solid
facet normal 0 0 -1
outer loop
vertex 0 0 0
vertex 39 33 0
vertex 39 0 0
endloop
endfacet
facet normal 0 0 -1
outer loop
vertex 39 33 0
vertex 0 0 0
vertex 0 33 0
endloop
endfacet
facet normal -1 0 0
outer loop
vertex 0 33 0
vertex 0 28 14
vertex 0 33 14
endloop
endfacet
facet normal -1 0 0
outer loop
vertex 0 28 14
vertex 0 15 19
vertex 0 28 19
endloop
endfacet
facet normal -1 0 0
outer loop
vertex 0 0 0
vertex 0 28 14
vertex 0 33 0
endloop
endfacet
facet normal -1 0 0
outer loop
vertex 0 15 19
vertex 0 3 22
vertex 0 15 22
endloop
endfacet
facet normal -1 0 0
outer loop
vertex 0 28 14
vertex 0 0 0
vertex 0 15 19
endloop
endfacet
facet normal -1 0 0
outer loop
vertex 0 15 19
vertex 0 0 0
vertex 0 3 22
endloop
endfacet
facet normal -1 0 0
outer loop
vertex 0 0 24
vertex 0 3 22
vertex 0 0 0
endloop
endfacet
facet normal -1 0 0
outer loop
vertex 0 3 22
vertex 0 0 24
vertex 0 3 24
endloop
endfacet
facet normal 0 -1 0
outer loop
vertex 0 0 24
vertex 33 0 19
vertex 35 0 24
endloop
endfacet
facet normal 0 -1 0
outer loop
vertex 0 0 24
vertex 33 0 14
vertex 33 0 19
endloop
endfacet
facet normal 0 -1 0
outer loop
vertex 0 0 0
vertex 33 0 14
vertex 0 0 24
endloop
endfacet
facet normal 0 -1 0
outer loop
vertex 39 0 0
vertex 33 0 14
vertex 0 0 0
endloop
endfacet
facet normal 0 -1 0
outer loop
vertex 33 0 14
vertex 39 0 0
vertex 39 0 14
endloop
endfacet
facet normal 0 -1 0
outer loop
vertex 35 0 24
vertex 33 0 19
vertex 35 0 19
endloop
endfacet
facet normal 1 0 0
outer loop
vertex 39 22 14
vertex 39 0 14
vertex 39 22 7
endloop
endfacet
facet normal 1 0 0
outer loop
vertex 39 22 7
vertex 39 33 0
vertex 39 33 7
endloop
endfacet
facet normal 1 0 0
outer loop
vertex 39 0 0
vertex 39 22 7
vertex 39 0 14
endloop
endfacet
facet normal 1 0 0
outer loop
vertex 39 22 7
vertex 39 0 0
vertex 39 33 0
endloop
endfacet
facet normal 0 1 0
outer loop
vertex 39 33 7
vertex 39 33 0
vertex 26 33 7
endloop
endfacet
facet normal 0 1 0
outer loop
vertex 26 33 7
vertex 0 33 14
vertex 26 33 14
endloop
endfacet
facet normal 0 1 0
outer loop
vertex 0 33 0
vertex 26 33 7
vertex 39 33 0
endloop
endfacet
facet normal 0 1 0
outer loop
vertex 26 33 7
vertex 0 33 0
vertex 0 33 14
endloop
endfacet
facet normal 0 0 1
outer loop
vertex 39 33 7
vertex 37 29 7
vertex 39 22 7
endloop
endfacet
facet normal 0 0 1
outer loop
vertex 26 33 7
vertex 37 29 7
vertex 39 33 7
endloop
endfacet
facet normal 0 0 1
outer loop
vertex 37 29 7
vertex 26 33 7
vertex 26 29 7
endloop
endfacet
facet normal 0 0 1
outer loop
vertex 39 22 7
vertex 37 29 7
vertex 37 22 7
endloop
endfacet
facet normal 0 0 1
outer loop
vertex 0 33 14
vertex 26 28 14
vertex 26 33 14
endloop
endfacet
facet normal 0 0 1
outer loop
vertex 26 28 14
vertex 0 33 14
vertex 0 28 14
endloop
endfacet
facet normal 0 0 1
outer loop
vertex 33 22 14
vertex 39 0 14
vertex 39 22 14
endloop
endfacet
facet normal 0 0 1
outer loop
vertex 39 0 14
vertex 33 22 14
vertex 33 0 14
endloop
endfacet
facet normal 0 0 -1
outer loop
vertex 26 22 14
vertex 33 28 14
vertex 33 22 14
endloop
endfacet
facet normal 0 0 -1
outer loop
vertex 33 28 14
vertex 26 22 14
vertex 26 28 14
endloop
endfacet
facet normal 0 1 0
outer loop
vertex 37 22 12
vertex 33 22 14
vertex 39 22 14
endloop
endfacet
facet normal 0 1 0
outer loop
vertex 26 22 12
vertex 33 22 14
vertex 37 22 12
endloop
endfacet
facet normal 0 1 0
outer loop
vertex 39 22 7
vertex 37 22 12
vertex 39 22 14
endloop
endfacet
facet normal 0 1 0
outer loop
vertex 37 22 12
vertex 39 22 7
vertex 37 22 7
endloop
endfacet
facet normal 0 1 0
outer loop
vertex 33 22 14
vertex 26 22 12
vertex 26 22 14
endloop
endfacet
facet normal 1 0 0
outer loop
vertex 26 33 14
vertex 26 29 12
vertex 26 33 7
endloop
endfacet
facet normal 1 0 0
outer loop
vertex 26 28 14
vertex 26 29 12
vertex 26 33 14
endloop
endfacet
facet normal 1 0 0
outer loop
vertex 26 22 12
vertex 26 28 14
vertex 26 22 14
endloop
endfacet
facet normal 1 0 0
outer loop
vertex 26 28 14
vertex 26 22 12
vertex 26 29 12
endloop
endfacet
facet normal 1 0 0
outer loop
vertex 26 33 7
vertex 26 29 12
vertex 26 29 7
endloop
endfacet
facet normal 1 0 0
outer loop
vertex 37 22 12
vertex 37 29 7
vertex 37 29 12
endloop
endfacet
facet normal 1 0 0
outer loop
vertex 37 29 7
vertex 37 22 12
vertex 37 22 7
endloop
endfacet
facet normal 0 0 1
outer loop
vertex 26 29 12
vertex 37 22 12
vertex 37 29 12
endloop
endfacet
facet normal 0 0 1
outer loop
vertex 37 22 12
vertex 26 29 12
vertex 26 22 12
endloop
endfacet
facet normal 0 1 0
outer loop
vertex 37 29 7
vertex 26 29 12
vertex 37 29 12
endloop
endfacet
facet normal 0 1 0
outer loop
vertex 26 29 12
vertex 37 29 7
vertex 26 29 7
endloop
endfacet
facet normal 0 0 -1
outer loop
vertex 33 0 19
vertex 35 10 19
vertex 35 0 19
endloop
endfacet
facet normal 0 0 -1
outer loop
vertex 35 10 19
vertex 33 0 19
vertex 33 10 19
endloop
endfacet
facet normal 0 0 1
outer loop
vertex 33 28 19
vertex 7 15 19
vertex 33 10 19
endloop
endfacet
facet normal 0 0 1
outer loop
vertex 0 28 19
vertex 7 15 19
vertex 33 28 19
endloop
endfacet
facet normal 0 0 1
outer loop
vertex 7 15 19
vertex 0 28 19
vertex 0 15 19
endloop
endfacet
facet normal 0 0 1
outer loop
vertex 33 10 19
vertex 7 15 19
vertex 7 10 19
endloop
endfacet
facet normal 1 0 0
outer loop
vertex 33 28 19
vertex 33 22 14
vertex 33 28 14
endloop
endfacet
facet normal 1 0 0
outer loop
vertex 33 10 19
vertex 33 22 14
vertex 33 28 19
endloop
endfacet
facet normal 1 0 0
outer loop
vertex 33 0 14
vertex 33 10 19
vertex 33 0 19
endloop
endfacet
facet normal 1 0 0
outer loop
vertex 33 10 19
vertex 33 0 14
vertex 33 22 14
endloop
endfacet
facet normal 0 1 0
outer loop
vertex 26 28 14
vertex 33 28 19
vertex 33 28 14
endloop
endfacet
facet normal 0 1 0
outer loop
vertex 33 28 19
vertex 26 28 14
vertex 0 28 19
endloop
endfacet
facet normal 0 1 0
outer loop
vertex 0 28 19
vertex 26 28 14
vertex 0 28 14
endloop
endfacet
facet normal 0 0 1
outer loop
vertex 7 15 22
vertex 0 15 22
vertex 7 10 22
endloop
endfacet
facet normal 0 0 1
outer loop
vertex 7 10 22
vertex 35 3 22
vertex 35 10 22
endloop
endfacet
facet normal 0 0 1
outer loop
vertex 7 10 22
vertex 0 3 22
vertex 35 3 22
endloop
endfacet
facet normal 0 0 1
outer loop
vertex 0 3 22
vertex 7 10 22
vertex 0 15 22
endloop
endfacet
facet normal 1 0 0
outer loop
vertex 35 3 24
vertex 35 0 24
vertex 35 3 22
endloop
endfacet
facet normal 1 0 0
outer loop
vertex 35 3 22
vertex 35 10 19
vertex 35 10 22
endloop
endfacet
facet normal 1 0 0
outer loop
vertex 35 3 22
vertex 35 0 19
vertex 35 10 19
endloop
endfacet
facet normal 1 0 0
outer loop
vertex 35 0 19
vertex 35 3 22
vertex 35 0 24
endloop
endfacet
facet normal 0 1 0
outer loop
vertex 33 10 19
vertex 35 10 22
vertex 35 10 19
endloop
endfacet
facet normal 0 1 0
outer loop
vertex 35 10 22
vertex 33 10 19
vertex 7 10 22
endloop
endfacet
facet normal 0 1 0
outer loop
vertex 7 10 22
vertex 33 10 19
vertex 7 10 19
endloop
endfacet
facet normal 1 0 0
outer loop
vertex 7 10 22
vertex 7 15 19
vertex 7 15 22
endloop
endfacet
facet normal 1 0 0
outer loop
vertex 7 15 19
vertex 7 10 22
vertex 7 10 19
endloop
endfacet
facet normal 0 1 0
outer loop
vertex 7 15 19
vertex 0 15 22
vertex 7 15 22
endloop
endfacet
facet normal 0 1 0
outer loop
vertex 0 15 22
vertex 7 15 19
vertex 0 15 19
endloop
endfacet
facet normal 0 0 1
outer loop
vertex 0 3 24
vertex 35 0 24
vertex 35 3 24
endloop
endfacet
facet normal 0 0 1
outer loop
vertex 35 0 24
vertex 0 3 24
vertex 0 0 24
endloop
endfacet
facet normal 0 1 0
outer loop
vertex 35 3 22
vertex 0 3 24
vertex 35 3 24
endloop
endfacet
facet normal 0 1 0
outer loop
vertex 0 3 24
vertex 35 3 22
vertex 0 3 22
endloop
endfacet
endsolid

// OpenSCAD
translate([6.5, 5.5, 3.5]) color([0.7978743610995221, 0.8123286615584164, 0.12432480215345709]) cube([13, 11, 7], center=true);
translate([19.5, 5.5, 3.5]) color([0.11600806340273684, 0.49773452003699037, 0.03782437966691787]) cube([13, 11, 7], center=true);
translate([32.5, 5.5, 3.5]) color([0.3350819106008931, 0.6871104903101904, 0.1556641006446543]) cube([13, 11, 7], center=true);
translate([6.5, 16.5, 3.5]) color([0.16655617674247947, 0.5644873855678092, 0.8061184955728092]) cube([13, 11, 7], center=true);
translate([19.5, 16.5, 3.5]) color([0.9914997491156944, 0.08692177434142434, 0.8077725699891862]) cube([13, 11, 7], center=true);
translate([32.5, 16.5, 3.5]) color([0.19804028235278703, 0.22105871931579824, 0.38481190061458204]) cube([13, 11, 7], center=true);
translate([6.5, 27.5, 3.5]) color([0.09807651038324794, 0.5564746075794378, 0.289820808533909]) cube([13, 11, 7], center=true);
translate([19.5, 27.5, 3.5]) color([0.9201526827262252, 0.7882887690133504, 0.714406368727256]) cube([13, 11, 7], center=true);
translate([32.5, 27.5, 3.5]) color([0.21725354658840645, 0.08366324281939452, 0.2201378642652858]) cube([13, 11, 7], center=true);
translate([6.5, 5.5, 10.5]) color([0.9991066326269249, 0.5852279869996022, 0.1665811123789923]) cube([13, 11, 7], center=true);
translate([19.5, 5.5, 10.5]) color([0.1919450116047291, 0.1150124003280546, 0.8219806914298157]) cube([13, 11, 7], center=true);
translate([32.5, 5.5, 10.5]) color([0.8528586901873659, 0.02761895137288195, 0.5258157137901469]) cube([13, 11, 7], center=true);
translate([6.5, 16.5, 10.5]) color([0.752438401258893, 0.20168791799925478, 0.4970874741521001]) cube([13, 11, 7], center=true);
translate([19.5, 16.5, 10.5]) color([0.2564796746315954, 0.6409972685732053, 0.9970404948887329]) cube([13, 11, 7], center=true);
translate([32.5, 16.5, 10.5]) color([0.797433214008021, 0.6234150837835258, 0.10462968943990791]) cube([13, 11, 7], center=true);
translate([6.5, 27.5, 10.5]) color([0.4584080456050631, 0.3616420965372864, 0.8269865896652219]) cube([13, 11, 7], center=true);
translate([19.5, 27.5, 10.5]) color([0.10474628201641056, 0.596240475647071, 0.48790140560568873]) cube([13, 11, 7], center=true);
translate([31.5, 25.5, 9.5]) color([0.5639041170917963, 0.6383635452384463, 0.42323888002080157]) cube([11, 7, 5], center=true);
translate([5.5, 3.5, 16.5]) color([0.5212286449626529, 0.6793183678168555, 0.8877818831984722]) cube([11, 7, 5], center=true);
translate([16.5, 3.5, 16.5]) color([0.8335334993782705, 0.998183045526196, 0.635064793155105]) cube([11, 7, 5], center=true);
translate([27.5, 3.5, 16.5]) color([0.8746990054994174, 0.5428090736997917, 0.9313134045807503]) cube([11, 7, 5], center=true);
translate([5.5, 10.5, 16.5]) color([0.009704659433814156, 0.7055937347007278, 0.7470388851985934]) cube([11, 7, 5], center=true);
translate([16.5, 10.5, 16.5]) color([0.3182594390073298, 0.32182488616904803, 0.5251073848334467]) cube([11, 7, 5], center=true);
translate([27.5, 10.5, 16.5]) color([0.8744832594460391, 0.6025867148054135, 0.15590536476920036]) cube([11, 7, 5], center=true);
translate([5.5, 17.5, 16.5]) color([0.37900510864666237, 0.2943823465565715, 0.7063732058335496]) cube([11, 7, 5], center=true);
translate([16.5, 17.5, 16.5]) color([0.47043138046830235, 0.799945824478888, 0.5165278007752844]) cube([11, 7, 5], center=true);
translate([27.5, 17.5, 16.5]) color([0.9155142682747232, 0.06635468620874474, 0.13049414784187097]) cube([11, 7, 5], center=true);
translate([5.5, 24.5, 16.5]) color([0.3004482911175872, 0.7588987264331779, 0.4485890964462933]) cube([11, 7, 5], center=true);
translate([16.5, 24.5, 16.5]) color([0.8619033855251227, 0.8006454493762514, 0.8686955098516022]) cube([11, 7, 5], center=true);
translate([27.5, 24.5, 16.5]) color([0.4607350972935428, 0.37132186818867685, 0.38223256097056324]) cube([11, 7, 5], center=true);
translate([3.5, 2.5, 20.5]) color([0.5298076607467874, 0.033618014856222844, 0.09064689039119589]) cube([7, 5, 3], center=true);
translate([10.5, 2.5, 20.5]) color([0.7941451579713075, 0.5179983582932232, 0.6001422851572377]) cube([7, 5, 3], center=true);
translate([17.5, 2.5, 20.5]) color([0.07635810782734587, 0.42636667866841493, 0.7546182662703457]) cube([7, 5, 3], center=true);
translate([24.5, 2.5, 20.5]) color([0.2896641383723638, 0.9011387199060191, 0.4178406508691356]) cube([7, 5, 3], center=true);
translate([31.5, 2.5, 20.5]) color([0.9725485107467589, 0.8454919814395919, 0.9722338049752182]) cube([7, 5, 3], center=true);
translate([3.5, 7.5, 20.5]) color([0.6074299110948179, 0.23357109614697547, 0.8647767439340015]) cube([7, 5, 3], center=true);
translate([10.5, 7.5, 20.5]) color([0.020481785066310598, 0.8852550461906246, 0.7407454042283365]) cube([7, 5, 3], center=true);
translate([17.5, 7.5, 20.5]) color([0.30244204779608386, 0.5702666361217156, 0.3326858137966755]) cube([7, 5, 3], center=true);
translate([24.5, 7.5, 20.5]) color([0.49351002171548763, 0.2620075340788589, 0.8250203378707534]) cube([7, 5, 3], center=true);
translate([31.5, 7.5, 20.5]) color([0.7724801555877414, 0.3841597274693662, 0.3836794276703801]) cube([7, 5, 3], center=true);
translate([3.5, 12.5, 20.5]) color([0.16379542381305134, 0.9355243379423083, 0.23895170008456956]) cube([7, 5, 3], center=true);
translate([2.5, 1.5, 23.0]) color([0.7294506641472926, 0.334024645801835, 0.9418620991403894]) cube([5, 3, 2], center=true);
translate([7.5, 1.5, 23.0]) color([0.4813304127593788, 0.14090487727396894, 0.8899614875266342]) cube([5, 3, 2], center=true);
translate([12.5, 1.5, 23.0]) color([0.6019667067914363, 0.08161964024263468, 0.6986964058233333]) cube([5, 3, 2], center=true);
translate([17.5, 1.5, 23.0]) color([0.8102884962164306, 0.3527718366022422, 0.03517979094215373]) cube([5, 3, 2], center=true);
translate([22.5, 1.5, 23.0]) color([0.4662789582213983, 0.458882332198567, 0.10148050986892876]) cube([5, 3, 2], center=true);
translate([27.5, 1.5, 23.0]) color([0.7781483542276006, 0.02022807324279441, 0.5983002604350479]) cube([5, 3, 2], center=true);
translate([32.5, 1.5, 23.0]) color([0.13270195297871745, 0.3239113547302247, 0.7000796910311562]) cube([5, 3, 2], center=true);
